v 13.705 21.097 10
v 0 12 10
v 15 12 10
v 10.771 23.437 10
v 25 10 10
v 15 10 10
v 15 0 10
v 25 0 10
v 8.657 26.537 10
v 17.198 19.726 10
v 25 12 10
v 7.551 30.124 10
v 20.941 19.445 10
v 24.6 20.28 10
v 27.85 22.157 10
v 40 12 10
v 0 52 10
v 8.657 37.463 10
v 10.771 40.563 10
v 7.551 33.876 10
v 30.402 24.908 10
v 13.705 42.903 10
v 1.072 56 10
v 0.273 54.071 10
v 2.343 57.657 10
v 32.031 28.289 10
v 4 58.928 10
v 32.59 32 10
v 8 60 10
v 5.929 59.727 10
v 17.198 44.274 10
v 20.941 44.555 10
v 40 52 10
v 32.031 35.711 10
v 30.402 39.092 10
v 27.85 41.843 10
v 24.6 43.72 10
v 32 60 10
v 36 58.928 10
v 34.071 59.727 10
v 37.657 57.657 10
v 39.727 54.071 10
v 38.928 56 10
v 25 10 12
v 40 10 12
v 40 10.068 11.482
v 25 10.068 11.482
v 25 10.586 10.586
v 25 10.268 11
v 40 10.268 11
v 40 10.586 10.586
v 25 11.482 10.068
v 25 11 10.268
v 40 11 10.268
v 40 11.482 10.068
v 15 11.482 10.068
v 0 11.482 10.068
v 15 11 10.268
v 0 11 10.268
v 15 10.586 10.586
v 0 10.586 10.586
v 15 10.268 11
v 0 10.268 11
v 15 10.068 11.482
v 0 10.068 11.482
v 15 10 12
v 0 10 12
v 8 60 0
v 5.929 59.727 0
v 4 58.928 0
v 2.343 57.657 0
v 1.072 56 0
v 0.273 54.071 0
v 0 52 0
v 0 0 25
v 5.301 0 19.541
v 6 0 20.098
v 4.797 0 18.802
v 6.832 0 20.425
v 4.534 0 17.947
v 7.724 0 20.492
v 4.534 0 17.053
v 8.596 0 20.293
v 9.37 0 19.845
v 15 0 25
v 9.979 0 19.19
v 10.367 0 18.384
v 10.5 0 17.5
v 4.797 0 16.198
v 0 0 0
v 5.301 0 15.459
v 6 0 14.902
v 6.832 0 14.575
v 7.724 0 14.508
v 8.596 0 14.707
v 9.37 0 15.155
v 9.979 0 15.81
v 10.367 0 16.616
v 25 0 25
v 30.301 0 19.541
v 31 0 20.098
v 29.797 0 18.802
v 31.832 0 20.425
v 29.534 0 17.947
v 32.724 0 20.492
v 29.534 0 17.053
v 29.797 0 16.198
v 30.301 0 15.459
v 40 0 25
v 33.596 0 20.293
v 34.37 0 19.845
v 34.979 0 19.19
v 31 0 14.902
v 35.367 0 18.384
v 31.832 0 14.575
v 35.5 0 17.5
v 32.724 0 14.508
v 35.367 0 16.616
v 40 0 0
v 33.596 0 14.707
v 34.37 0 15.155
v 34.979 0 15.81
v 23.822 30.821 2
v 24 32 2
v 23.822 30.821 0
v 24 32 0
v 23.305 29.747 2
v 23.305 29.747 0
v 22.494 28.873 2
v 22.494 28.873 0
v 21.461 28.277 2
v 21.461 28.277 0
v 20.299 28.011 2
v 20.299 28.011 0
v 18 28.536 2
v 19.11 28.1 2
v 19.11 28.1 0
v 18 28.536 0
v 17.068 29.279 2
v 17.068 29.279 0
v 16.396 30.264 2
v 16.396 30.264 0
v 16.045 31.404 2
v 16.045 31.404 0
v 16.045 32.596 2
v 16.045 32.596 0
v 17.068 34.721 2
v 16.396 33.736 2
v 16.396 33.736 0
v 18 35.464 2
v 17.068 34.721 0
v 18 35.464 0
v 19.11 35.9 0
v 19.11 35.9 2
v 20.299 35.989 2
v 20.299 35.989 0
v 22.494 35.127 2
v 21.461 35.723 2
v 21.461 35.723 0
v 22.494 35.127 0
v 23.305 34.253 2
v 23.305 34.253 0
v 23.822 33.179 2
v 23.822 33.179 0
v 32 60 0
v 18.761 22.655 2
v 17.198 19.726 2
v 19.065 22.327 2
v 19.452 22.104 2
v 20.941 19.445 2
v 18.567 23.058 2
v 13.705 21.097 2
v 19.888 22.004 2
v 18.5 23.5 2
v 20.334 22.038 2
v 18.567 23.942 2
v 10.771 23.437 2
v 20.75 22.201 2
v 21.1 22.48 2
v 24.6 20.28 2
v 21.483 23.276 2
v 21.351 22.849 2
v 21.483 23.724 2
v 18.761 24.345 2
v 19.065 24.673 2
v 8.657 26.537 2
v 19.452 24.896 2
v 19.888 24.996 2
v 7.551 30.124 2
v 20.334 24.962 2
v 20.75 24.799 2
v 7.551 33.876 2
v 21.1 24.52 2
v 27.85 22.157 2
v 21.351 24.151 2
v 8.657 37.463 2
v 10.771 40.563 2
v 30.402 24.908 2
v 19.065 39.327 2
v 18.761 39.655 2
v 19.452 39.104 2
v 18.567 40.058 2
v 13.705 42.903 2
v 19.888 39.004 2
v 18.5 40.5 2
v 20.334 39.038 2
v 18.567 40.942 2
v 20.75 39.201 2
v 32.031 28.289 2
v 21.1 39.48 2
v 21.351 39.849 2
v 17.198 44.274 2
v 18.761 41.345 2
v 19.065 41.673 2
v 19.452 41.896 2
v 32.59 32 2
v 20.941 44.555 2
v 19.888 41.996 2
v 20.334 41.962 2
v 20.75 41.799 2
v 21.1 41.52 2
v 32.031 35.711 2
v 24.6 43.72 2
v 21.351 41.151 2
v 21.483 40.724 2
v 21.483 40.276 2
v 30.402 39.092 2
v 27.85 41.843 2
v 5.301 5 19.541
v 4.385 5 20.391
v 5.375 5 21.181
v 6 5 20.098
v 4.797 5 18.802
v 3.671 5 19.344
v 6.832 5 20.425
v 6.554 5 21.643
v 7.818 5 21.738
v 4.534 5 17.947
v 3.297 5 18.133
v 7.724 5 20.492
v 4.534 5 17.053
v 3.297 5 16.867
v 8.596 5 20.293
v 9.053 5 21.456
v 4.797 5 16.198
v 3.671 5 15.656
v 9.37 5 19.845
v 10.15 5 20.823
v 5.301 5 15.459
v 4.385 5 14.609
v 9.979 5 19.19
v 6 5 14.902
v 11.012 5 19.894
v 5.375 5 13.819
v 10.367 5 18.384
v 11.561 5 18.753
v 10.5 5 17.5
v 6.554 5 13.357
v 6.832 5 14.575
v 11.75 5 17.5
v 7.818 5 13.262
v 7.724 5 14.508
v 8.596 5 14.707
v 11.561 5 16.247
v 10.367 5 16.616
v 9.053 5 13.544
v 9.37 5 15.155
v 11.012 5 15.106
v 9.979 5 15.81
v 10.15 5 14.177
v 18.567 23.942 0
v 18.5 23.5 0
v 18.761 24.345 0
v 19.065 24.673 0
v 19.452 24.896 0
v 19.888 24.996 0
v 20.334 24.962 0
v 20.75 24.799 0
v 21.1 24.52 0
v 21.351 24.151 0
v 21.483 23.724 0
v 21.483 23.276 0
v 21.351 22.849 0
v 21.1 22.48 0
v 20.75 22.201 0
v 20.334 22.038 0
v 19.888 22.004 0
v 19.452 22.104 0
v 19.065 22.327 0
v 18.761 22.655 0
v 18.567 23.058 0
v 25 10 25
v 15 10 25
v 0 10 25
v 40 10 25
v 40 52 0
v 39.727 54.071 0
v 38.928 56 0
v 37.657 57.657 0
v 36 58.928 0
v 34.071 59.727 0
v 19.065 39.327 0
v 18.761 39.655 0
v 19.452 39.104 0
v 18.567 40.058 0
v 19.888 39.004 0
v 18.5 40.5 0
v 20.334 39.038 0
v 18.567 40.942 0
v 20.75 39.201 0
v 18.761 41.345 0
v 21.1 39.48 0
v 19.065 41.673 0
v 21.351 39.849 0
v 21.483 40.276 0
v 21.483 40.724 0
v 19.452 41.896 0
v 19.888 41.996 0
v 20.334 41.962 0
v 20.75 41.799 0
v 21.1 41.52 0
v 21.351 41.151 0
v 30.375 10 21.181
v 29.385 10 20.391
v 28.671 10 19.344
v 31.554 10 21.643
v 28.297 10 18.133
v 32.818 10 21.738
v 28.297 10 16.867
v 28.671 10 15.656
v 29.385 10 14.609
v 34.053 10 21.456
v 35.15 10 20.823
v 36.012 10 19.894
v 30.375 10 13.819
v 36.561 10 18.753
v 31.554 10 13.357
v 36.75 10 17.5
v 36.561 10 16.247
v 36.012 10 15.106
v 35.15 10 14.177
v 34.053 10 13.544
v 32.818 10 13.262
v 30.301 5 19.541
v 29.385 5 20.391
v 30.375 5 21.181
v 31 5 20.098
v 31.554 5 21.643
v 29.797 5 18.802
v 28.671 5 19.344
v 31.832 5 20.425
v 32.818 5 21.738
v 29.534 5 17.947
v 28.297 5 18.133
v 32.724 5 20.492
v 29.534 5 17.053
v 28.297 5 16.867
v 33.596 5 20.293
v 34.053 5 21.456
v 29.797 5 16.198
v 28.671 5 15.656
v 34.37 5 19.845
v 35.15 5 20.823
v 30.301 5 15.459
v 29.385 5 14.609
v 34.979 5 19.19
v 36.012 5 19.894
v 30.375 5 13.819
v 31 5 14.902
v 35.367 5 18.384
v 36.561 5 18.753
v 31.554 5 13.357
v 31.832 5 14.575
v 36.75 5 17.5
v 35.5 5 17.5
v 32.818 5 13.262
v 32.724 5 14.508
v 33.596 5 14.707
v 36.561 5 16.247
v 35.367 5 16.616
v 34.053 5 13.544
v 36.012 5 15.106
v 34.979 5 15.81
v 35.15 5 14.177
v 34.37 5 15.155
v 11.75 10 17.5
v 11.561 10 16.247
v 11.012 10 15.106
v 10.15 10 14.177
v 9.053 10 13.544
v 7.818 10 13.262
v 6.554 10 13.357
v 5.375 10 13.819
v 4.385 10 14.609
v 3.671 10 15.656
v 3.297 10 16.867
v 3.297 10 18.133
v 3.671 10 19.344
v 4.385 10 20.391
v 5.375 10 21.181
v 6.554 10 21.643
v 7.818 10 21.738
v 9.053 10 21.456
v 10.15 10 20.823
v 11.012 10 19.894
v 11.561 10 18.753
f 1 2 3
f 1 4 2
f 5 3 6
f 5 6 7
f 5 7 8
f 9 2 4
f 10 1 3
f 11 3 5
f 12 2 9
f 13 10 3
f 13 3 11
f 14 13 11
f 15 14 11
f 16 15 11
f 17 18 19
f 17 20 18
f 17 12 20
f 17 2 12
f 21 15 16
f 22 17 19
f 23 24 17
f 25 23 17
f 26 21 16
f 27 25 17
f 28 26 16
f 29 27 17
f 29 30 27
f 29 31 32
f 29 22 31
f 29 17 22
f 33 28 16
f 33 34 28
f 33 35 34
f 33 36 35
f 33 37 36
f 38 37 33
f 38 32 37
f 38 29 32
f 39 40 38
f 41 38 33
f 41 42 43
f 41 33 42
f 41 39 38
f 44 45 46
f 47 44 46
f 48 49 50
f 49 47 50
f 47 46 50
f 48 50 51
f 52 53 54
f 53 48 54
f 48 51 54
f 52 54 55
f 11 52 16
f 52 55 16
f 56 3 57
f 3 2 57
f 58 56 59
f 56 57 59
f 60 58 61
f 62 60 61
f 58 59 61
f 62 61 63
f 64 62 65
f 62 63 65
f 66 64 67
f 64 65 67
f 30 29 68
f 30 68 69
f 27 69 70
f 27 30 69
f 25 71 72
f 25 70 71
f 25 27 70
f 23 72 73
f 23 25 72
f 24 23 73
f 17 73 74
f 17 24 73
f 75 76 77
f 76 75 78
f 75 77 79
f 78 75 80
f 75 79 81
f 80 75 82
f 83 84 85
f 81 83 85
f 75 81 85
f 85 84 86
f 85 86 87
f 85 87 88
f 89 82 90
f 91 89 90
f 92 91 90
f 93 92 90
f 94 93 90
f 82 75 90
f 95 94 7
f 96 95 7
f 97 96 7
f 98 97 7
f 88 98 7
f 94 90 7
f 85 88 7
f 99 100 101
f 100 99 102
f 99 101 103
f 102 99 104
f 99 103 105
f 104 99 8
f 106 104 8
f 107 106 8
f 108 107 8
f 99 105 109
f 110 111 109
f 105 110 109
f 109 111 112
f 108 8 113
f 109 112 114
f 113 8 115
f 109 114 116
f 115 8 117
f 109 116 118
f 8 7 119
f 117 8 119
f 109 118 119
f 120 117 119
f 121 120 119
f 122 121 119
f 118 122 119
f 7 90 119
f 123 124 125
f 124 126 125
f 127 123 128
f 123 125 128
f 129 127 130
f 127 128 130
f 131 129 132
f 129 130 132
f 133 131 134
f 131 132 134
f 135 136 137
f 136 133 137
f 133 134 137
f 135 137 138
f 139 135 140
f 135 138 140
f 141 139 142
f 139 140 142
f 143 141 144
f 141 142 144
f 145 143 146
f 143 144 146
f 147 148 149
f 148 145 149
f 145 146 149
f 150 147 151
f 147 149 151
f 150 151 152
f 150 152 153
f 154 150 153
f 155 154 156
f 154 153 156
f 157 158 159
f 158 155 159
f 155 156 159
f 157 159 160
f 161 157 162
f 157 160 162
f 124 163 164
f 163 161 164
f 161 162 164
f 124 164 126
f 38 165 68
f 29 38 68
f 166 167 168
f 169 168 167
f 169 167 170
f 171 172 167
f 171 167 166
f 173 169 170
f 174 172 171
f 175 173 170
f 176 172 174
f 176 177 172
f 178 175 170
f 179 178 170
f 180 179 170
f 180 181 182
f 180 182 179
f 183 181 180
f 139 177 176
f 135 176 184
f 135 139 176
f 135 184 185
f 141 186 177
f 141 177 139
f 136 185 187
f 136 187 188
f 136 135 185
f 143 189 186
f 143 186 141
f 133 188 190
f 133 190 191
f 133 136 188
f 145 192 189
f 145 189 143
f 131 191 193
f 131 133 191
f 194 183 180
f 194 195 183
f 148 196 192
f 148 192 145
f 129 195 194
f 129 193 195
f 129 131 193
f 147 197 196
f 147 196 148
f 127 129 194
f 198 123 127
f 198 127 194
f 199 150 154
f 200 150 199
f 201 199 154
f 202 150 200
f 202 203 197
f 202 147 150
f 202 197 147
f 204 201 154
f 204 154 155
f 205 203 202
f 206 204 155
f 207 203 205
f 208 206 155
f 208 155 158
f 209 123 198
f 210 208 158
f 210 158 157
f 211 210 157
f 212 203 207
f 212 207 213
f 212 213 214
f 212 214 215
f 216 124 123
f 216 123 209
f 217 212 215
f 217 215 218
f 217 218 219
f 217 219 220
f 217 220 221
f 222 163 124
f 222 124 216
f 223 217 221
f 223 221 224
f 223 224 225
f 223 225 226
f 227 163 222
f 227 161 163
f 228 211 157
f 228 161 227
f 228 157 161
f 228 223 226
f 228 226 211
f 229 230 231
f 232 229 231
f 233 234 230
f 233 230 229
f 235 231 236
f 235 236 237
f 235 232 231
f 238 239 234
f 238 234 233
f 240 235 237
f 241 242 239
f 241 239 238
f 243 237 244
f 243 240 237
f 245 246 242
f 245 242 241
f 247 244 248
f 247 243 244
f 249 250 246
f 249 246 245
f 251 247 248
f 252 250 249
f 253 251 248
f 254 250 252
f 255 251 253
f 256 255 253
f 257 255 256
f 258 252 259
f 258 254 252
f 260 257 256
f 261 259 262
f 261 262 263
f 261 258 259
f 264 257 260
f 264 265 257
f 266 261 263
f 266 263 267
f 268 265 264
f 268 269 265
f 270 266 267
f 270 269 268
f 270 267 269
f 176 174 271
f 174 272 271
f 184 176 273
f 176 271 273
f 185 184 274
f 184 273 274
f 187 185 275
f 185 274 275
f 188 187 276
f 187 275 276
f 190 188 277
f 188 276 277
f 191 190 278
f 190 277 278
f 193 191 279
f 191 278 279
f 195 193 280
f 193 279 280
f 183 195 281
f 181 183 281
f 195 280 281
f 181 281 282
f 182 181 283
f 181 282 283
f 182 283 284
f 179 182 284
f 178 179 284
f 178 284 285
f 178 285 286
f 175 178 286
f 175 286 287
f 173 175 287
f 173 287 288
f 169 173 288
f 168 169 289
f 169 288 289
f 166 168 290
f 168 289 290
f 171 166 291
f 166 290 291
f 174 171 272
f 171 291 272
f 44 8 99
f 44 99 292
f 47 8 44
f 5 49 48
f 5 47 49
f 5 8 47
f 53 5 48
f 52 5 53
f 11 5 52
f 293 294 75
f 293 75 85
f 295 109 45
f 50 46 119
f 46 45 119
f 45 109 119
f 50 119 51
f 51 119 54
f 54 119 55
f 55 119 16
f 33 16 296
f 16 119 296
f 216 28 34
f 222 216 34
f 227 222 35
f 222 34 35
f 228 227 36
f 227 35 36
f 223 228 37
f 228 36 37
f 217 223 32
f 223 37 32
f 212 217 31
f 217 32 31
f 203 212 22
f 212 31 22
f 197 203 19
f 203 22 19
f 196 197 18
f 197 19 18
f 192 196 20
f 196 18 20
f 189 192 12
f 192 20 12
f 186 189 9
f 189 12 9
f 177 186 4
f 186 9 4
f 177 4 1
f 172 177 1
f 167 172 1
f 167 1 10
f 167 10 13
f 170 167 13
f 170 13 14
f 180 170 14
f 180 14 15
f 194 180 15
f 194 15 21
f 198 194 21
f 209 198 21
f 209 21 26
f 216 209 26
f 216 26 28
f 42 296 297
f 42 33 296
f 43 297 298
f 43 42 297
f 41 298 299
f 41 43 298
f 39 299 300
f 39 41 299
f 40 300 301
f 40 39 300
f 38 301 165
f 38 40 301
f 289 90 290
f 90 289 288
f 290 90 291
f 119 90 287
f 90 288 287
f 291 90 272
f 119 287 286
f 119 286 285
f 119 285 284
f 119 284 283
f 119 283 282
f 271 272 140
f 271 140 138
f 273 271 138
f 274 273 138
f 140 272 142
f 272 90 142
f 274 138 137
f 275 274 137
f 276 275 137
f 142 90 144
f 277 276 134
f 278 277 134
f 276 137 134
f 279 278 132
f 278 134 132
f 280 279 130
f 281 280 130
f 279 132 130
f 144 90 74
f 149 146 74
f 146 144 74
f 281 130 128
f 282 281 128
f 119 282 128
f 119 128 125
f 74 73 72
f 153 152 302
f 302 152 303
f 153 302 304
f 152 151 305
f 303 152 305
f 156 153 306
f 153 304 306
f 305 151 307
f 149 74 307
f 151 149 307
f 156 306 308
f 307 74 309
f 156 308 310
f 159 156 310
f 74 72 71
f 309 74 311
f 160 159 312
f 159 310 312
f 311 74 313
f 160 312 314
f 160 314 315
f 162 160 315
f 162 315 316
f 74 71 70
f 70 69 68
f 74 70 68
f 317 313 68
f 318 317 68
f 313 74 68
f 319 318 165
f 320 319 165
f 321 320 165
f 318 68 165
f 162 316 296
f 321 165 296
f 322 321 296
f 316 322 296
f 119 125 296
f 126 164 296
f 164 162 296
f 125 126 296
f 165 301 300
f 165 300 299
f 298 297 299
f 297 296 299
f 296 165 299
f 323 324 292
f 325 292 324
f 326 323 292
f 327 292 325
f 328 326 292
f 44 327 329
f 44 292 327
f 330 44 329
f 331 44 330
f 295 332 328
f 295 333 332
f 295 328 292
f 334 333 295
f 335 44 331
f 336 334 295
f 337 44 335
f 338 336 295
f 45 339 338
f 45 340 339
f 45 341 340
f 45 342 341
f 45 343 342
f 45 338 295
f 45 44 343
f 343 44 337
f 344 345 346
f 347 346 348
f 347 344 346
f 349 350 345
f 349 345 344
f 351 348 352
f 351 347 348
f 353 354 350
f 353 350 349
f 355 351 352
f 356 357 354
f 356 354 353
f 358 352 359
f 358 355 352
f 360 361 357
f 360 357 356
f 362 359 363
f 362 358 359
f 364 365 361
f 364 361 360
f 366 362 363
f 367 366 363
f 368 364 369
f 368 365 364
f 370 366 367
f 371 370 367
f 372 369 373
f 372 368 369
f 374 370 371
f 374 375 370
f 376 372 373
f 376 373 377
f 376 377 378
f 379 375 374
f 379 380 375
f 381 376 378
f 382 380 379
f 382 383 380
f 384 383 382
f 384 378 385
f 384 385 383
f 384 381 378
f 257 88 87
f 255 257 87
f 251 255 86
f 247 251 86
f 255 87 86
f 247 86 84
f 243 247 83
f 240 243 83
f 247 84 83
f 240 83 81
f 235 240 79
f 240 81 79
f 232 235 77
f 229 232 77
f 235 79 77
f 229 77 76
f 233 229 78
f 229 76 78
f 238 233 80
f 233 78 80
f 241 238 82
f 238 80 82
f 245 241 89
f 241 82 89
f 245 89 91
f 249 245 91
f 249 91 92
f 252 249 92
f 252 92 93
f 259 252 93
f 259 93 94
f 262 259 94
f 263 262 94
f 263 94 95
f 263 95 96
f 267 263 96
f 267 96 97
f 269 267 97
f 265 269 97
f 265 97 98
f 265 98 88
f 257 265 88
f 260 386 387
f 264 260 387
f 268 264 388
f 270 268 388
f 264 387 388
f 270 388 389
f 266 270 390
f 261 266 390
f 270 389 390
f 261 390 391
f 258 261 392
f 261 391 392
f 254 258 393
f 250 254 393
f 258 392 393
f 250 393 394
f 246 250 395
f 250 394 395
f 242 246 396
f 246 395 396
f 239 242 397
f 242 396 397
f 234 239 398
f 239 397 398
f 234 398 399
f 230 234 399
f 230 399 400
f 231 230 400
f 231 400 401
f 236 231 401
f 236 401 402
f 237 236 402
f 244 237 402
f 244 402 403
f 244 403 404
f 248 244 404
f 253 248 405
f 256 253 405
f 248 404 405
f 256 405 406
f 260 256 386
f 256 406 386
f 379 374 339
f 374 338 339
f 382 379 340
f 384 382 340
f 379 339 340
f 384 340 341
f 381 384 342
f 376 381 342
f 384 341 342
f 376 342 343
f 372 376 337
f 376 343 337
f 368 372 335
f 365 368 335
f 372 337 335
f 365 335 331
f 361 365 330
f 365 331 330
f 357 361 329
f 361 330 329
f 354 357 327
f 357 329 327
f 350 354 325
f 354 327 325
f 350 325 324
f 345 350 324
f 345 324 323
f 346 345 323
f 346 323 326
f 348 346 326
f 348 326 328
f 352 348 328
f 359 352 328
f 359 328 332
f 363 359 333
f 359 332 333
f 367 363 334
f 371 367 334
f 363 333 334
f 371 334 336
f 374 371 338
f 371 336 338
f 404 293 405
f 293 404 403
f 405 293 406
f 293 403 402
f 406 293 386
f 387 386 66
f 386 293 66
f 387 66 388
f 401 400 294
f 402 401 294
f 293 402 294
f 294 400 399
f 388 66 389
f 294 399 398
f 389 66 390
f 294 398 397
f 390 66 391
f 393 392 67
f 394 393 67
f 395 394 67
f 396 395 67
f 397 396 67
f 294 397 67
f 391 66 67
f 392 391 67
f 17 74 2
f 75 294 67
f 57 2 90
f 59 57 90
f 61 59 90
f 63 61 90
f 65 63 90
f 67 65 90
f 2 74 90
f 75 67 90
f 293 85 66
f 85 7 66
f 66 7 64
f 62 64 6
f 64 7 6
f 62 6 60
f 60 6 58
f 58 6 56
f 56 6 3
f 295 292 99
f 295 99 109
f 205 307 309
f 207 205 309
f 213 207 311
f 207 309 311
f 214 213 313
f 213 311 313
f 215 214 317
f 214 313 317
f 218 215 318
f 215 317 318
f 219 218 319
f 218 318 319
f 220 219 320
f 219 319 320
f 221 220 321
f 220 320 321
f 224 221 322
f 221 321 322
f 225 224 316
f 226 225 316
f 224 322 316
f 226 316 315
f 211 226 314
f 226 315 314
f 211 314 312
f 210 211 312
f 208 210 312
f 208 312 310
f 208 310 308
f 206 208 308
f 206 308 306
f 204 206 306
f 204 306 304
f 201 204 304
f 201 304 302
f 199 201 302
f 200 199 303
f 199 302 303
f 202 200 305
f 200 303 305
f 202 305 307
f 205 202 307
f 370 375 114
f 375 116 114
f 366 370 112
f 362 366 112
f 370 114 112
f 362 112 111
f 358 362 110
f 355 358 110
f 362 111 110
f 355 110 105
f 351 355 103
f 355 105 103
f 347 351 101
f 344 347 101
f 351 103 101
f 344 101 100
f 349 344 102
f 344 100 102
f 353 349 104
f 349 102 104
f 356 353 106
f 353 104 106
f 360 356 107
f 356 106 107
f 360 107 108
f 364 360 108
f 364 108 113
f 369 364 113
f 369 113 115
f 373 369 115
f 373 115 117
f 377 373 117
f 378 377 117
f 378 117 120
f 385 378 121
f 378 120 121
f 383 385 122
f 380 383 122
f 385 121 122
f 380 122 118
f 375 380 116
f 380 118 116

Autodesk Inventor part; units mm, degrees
ref_plane "YZ Plane" through (0, 0, 0) normal (1, 0, 0) x (0, 1, 0)
ref_plane "XZ Plane" through (0, 0, 0) normal (0, 1, 0) x (-1, 0, 0)
ref_plane "XY Plane" through (0, 0, 0) normal (0, 0, 1) x (1, 0, 0)
sketch "Boceto1" plane through (0, 0, 0) normal (0, 0, 1) x (1, 0, 0)
  line L0 (0, 0) -> (40, 0)
  line L1 (40, 0) -> (40, 60)
  line L2 (40, 60) -> (0, 60)
  line L3 (0, 60) -> (0, 0)
  circle A0 centre (20, 32) radius 4
  dimension "d0" = 40
  dimension "d1" = 60
  dimension "d2" = 8
  dimension "d31" = 32
extrude "Extrusión1" add sketch "Boceto1" along normal blind 10
sketch "Boceto2" plane through (0, 0, 10) normal (0, 0, 1) x (1, 0, 0)
  circle A0 centre (20, 32) radius 4 projected
  circle A1 centre (20, 32) radius 12.59
  point P0 (0, 0)
  dimension "d5" = 25.18
extrude "Extrusión2" cut sketch "Boceto2" against normal blind 8
fillet "Empalme1" radius 8 2 edges at (40, 60, 5) (0, 60, 5)
sketch "Boceto4" plane through (0, 0, 0) normal (0, 0, -1) x (-1, 0, 0)
  circle A0 centre (-20, 40.5) radius 1.5
  circle A1 centre (-20, 23.5) radius 1.5
  circle A2 centre (-20, 32) radius 4 projected
  point P0 (0, 0)
  dimension "d11" = 3
  dimension "d12" = 3
  dimension "d14" = 8.5
  dimension "d15" = 17
extrude "Extrusión4" cut sketch "Boceto4" against normal blind 2 contours A0 | A1
sketch "Boceto5" plane through (0, 0, 10) normal (0, 0, 1) x (1, 0, 0)
  line L0 (0, 52) -> (0, 0) projected
  line L1 (0, 0) -> (15, 0)
  line L2 (15, 0) -> (15, 10)
  line L3 (15, 10) -> (0, 10)
  line L4 (0, 10) -> (0, 0)
  line L5 (40, 0) -> (40, 52) projected
  line L6 (40, 0) -> (25, 0)
  line L7 (25, 0) -> (25, 10)
  line L8 (25, 10) -> (40, 10)
  line L9 (40, 10) -> (40, 0)
  point P0 (0, 10)
  dimension "d18" = 15
  dimension "d19" = 10
  dimension "d20" = 15
  dimension "d21" = 10
extrude "Extrusión5" add sketch "Boceto5" along normal blind 15
sketch "Boceto6" plane through (0, 10, 10) normal (0, 1, 0) x (1, 0, 0)
  line L0 (15, -15) -> (0, -15) projected
  line L1 (0, 0) -> (15, 0) projected
  line L2 (15, 0) -> (15, -15) projected
  circle A0 centre (7.5, -7.5) radius 3
  line L3 (25, -15) -> (40, -15) projected
  circle A1 centre (32.5, -7.5) radius 3
  circle A2 centre (7.5, -7.5) radius 4.25
  circle A3 centre (32.5, -7.5) radius 4.25
  line L4 (0, 0) -> (0, -15) projected
  line L5 (40, 0) -> (40, -15) projected
  line L6 (40, 0) -> (32, 0) projected
  point P0 (0, 10)
  point P1 (40, -7.5)
  dimension "d24" = 6
  dimension "d25" = 6
  dimension "d32" = 8.5
  dimension "d33" = 8.5
  dimension "d36" = 7.5
  dimension "d37" = 7.5
  dimension "d38" = 7.5
  dimension "d39" = 7.5
extrude "Extrusión6" cut sketch "Boceto6" against normal blind 5 contours A0 | A1
extrude "Extrusión7" cut sketch "Boceto6" against normal blind 5 contours A2 | A3
sketch "Boceto7" plane through (0, 0, 0) normal (0, -1, 0) x (1, 0, 0)
  circle A0 centre (32.5, 17.5) radius 4.25 projected
  circle A1 centre (32.5, 17.5) radius 3
  circle A2 centre (7.5, 17.5) radius 4.25 projected
  circle A3 centre (7.5, 17.5) radius 3
  point P0 (0, 0)
  dimension "d40" = 6
  dimension "d41" = 6
extrude "Extrusión8" cut sketch "Boceto7" against normal blind 5 contours A1 | A3
fillet "Empalme2" radius 2 1 edges at (7.5, 10, 10)
fillet "Empalme3" radius 2 1 edges at (32.5, 10, 10)
properties part number "sujeción motor-acople"
